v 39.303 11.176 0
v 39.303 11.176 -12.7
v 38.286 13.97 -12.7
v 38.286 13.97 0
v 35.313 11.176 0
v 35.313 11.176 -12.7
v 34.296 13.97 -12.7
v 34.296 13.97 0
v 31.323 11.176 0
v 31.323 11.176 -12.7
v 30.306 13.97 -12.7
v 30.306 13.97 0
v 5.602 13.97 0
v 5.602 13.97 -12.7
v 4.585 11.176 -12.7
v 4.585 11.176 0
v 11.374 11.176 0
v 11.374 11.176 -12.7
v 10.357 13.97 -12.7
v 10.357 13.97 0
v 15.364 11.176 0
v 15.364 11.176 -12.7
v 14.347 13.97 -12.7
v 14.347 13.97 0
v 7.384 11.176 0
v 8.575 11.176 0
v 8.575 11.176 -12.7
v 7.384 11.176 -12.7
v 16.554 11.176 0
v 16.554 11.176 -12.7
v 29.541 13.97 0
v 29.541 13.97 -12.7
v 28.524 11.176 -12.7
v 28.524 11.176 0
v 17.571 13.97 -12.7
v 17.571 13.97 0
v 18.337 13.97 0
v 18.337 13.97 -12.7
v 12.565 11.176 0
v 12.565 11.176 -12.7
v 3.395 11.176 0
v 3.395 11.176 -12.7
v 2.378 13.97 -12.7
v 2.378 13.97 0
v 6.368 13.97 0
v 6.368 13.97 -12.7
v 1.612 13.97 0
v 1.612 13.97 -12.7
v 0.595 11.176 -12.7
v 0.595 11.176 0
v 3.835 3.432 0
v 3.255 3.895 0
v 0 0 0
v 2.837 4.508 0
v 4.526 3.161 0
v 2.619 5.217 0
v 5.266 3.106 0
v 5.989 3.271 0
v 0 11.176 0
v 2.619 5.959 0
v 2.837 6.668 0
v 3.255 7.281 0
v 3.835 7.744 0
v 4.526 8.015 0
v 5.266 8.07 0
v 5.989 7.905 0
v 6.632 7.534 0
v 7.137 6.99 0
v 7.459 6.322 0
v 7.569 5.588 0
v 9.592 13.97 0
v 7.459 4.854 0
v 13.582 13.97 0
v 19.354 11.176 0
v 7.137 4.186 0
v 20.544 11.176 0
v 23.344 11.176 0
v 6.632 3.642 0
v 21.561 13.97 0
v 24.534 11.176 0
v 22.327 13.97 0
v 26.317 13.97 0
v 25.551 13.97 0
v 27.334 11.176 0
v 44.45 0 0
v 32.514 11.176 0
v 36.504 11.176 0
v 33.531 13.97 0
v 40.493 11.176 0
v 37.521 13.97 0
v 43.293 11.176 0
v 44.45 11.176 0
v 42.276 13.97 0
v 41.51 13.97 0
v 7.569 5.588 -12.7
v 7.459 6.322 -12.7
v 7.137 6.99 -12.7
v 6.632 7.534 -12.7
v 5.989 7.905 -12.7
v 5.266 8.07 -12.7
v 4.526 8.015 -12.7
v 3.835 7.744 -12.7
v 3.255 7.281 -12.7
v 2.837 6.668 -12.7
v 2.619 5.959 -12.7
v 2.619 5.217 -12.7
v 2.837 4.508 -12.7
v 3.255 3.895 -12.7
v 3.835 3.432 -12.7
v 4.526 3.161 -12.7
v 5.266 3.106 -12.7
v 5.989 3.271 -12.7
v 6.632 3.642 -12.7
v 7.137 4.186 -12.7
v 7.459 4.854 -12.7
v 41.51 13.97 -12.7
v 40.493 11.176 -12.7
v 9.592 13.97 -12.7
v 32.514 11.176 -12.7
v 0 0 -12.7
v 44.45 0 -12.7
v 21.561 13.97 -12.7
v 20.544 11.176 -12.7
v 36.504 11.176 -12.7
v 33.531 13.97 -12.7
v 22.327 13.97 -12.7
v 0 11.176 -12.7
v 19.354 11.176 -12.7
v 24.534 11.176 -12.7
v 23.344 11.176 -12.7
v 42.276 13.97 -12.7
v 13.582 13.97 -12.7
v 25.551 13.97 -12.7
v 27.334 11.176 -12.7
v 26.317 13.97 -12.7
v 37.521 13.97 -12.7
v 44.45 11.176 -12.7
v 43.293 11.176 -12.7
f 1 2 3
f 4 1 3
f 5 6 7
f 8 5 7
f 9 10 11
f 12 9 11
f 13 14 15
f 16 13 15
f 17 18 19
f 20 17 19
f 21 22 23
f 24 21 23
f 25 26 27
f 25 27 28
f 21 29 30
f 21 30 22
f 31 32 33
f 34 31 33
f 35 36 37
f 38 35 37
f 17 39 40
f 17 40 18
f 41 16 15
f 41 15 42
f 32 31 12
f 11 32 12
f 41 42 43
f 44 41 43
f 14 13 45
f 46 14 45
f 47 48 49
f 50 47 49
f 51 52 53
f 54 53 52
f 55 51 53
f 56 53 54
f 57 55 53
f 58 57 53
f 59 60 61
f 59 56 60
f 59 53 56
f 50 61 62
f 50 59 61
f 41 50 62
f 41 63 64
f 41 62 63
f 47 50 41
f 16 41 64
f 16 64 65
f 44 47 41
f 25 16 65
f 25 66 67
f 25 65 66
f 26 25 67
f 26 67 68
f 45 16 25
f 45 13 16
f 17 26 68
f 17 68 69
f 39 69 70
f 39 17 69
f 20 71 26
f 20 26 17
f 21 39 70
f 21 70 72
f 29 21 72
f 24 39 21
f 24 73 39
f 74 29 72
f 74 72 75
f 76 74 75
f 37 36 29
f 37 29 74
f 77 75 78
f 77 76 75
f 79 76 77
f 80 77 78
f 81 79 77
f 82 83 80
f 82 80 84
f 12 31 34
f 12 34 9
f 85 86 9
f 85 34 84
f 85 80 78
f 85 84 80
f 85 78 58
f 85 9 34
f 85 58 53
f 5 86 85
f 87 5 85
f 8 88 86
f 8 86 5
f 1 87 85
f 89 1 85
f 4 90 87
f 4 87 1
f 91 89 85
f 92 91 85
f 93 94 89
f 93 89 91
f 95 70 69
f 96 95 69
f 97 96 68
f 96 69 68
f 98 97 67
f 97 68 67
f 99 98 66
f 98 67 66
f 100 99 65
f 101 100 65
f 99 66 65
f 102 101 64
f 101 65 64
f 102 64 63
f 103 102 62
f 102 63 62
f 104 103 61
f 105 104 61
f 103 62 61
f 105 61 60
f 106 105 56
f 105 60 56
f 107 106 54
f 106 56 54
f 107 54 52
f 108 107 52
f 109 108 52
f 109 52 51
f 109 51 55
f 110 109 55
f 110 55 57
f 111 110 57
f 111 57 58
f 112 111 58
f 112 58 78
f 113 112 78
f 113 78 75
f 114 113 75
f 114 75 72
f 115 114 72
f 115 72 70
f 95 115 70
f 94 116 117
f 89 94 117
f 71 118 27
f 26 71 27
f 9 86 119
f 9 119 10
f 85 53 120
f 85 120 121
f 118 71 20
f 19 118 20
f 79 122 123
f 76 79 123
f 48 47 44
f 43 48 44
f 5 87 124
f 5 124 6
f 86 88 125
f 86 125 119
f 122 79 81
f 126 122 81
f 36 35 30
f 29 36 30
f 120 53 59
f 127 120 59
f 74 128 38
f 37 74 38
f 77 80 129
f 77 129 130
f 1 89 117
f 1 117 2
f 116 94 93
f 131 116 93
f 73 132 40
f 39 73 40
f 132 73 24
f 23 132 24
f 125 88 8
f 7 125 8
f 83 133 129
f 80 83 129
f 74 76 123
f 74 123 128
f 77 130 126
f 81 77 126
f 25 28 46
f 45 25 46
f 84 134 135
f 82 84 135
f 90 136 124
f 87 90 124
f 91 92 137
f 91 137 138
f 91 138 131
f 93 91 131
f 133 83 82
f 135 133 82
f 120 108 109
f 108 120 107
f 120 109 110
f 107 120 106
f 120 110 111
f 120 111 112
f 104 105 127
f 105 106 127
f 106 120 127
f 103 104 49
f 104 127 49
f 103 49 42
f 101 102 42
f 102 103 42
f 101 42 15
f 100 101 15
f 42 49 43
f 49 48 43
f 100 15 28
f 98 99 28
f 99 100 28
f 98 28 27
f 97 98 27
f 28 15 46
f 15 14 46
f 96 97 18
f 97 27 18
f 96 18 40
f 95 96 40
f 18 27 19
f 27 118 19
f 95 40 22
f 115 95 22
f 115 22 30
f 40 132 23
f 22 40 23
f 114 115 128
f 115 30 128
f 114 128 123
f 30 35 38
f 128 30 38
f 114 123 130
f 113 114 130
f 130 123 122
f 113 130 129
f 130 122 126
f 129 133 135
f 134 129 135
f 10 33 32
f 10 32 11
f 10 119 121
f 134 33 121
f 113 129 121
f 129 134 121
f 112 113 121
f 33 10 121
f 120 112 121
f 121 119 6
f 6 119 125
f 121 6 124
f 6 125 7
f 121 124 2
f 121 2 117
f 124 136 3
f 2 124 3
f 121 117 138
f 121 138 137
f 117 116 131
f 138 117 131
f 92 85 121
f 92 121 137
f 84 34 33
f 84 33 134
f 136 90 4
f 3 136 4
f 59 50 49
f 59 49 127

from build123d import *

# Parameters (mm, degrees)
BLANKSKE_W         = 44.45
BLANKSKE_H         = 13.97
BLANK_DEPTH        = 12.7
TOOTHCUTSIM_DEPTH  = 49.293409488
TEETHCUTS_COUNT    = 12
TEETHCUTS_PITCH    = 3.989822665
CUT_EXTRUDE1_REACH = 50.293
SKETCH1_R          = 2.4892


with BuildPart() as part:
    # BlankSke → Blank (new body)
    with BuildSketch(Plane.XY):
        with Locations((22.225, 6.985)):
            Rectangle(BLANKSKE_W, BLANKSKE_H)
    extrude(amount=-BLANK_DEPTH)

    # TooCutSkeSim → ToothCutSim (cut, through all)
    with BuildSketch(Plane.XY):
        Polygon((0.595165029, 11.176), (-0.595165029, 11.176), (-1.621342708, 13.9954), (1.621342708, 13.9954), align=None)
    toothcutsim = extrude(amount=-TOOTHCUTSIM_DEPTH, mode=Mode.SUBTRACT)

    # TeethCuts: ToothCutSim ×12
    with Locations(*[(i * TEETHCUTS_PITCH, 0, 0) for i in range(1, TEETHCUTS_COUNT)]):
        add(toothcutsim, mode=Mode.SUBTRACT)

    # Sketch1 → Cut-Extrude1 (cut, up to next)
    with BuildSketch(Plane.XY, mode=Mode.PRIVATE) as cut_extrude1_sk1:
        with Locations((5.08, 5.588)):
            Circle(SKETCH1_R)
    cut_extrude1_tool1 = extrude(cut_extrude1_sk1.sketch, amount=-CUT_EXTRUDE1_REACH, mode=Mode.PRIVATE) & part.part
    add(cut_extrude1_tool1.solids().sort_by_distance((5.08, 5.588, 0))[0], mode=Mode.SUBTRACT)


solid = part.part
